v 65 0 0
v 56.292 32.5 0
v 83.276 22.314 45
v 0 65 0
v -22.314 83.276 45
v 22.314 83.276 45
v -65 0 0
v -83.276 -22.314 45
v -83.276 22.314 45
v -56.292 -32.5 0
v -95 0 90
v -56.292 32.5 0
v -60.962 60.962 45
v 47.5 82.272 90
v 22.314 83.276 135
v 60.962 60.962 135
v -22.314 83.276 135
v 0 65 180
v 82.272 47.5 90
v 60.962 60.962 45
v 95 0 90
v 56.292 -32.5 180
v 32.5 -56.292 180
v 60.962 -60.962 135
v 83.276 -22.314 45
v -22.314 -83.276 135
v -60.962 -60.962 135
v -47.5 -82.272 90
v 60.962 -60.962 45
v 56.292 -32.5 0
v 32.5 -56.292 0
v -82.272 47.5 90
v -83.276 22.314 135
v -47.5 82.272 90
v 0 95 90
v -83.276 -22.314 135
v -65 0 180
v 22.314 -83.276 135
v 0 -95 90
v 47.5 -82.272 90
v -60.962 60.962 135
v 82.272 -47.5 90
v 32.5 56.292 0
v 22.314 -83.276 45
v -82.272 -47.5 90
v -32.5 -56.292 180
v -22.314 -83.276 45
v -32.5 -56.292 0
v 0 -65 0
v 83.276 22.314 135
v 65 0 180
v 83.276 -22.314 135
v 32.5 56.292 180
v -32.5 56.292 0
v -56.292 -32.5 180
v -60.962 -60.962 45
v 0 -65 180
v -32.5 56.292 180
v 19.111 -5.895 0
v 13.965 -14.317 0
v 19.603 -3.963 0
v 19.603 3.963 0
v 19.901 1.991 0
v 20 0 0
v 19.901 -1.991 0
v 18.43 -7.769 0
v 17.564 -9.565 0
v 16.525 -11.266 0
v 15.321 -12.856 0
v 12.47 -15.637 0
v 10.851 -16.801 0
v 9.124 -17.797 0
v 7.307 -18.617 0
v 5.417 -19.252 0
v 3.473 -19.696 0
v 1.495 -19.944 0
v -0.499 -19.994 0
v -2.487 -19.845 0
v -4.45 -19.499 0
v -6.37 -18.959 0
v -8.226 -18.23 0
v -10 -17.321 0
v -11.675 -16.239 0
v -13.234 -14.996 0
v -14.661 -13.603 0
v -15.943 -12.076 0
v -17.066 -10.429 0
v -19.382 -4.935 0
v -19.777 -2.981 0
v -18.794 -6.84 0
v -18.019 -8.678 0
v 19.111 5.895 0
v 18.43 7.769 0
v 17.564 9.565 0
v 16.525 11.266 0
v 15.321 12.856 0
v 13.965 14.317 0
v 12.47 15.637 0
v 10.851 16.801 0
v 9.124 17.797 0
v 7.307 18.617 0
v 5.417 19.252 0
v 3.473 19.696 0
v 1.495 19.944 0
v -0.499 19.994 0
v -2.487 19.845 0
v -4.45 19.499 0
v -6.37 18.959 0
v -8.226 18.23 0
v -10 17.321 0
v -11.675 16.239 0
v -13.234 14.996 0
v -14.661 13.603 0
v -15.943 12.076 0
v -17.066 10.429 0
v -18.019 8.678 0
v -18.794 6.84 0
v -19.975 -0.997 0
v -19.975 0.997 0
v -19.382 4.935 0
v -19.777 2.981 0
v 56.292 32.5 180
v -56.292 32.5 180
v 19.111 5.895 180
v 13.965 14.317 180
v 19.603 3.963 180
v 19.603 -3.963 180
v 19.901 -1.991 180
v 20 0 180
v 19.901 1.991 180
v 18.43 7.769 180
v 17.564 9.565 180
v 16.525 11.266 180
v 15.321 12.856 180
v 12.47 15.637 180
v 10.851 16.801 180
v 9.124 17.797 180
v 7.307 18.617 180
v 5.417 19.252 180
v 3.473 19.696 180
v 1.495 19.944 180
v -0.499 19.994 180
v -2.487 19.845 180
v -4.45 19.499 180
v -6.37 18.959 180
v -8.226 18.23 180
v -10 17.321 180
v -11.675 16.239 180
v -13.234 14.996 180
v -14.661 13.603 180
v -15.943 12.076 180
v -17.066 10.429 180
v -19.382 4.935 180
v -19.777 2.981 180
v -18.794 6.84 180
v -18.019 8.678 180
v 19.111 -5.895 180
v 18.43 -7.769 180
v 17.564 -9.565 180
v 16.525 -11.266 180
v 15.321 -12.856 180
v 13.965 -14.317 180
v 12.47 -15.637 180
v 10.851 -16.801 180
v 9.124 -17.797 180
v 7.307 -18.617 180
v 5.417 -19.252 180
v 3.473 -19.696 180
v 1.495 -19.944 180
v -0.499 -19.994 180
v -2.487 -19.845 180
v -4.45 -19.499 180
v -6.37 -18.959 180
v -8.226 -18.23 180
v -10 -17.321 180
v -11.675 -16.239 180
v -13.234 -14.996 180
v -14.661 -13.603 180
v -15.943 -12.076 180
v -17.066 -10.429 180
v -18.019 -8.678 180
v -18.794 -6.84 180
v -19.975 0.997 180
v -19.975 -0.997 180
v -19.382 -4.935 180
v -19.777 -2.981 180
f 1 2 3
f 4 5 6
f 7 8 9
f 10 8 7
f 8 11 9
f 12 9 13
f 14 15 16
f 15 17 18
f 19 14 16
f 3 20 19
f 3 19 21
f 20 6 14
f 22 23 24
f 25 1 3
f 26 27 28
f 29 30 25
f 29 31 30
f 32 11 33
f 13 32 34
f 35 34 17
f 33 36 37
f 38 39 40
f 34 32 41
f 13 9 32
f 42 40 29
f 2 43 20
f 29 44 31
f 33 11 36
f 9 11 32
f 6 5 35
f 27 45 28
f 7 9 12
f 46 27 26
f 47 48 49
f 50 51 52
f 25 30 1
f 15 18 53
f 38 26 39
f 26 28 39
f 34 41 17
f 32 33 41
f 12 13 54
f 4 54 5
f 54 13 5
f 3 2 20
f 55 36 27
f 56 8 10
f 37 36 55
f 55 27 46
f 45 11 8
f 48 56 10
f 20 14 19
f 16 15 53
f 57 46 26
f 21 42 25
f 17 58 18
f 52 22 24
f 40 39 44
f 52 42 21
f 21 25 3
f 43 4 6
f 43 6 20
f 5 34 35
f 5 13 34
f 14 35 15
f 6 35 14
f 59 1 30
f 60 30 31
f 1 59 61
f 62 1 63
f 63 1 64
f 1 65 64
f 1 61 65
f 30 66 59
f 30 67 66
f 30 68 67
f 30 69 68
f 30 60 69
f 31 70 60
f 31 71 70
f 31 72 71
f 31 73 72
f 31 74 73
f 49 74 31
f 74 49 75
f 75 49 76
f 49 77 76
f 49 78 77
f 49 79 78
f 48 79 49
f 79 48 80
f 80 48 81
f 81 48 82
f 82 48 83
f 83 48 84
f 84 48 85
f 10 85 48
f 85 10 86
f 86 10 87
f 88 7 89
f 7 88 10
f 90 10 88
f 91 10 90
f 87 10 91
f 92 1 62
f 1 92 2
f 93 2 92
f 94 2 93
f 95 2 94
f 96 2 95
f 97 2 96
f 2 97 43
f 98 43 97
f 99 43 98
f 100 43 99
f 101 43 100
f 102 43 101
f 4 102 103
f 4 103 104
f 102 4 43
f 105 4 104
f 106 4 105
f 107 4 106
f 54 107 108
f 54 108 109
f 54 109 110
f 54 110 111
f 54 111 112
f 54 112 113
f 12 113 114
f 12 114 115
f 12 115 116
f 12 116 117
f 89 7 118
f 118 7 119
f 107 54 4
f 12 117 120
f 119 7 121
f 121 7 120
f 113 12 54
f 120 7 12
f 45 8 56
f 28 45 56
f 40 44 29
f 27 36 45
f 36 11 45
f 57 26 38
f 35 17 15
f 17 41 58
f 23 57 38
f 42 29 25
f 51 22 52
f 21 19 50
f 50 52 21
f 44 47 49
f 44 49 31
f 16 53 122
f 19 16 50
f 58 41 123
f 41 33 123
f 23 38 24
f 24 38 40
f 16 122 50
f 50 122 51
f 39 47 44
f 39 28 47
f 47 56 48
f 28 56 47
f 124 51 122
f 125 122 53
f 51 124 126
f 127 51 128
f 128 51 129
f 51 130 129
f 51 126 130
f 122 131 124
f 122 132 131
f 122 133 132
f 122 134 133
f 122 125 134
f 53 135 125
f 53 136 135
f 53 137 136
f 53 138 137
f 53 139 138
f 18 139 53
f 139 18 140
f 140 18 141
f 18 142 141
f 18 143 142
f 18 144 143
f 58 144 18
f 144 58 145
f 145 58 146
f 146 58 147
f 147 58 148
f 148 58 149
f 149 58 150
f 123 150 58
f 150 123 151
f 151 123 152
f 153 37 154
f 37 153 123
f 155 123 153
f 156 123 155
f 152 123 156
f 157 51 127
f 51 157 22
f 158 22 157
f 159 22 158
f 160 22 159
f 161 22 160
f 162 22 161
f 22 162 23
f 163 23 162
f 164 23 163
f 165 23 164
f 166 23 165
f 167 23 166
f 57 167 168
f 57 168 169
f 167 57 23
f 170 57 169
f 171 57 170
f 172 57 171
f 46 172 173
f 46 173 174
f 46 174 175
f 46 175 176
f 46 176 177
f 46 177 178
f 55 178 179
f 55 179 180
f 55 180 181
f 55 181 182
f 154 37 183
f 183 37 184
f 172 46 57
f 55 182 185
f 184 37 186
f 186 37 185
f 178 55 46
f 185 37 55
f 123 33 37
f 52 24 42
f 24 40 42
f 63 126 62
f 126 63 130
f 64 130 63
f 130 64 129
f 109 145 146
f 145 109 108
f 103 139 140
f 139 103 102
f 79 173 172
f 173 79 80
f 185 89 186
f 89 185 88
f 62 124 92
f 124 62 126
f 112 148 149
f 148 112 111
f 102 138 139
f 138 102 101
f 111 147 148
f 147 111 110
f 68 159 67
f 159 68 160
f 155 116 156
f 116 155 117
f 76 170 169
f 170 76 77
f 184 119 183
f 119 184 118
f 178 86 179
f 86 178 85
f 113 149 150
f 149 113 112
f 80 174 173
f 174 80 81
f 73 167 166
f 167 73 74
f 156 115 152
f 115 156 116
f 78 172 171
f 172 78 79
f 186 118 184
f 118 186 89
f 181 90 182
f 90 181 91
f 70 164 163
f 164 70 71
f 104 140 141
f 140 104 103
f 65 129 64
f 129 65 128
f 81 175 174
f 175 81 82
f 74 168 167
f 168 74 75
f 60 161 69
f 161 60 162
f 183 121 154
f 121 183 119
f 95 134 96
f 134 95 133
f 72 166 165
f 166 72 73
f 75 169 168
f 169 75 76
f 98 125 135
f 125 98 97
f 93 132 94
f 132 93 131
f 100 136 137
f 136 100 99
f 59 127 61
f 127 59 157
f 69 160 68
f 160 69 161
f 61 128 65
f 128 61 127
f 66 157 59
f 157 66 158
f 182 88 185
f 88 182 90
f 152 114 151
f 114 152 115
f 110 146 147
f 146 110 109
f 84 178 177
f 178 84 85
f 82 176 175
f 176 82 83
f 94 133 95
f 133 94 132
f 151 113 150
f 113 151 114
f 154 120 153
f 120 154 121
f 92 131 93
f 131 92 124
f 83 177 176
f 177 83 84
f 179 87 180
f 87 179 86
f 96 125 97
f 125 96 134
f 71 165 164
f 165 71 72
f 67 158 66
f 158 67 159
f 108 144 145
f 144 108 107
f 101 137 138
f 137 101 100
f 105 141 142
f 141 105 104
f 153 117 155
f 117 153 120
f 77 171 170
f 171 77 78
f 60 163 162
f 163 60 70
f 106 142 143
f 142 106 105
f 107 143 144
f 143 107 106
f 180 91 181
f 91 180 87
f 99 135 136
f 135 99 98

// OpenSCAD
CylinderPoints = [[65.0, 0.0, 0.0], [56.2917, 32.5, 0.0], [32.5, 56.2917, 0.0], [0.0, 65.0, 0.0], [-32.5, 56.2917, 0.0], [-56.2917, 32.5, 0.0], [-65.0, 0.0, 0.0], [-56.2917, -32.5, 0.0], [-32.5, -56.2917, 0.0], [-0.0, -65.0, 0.0], [32.5, -56.2917, 0.0], [56.2917, -32.5, 0.0], [83.2756, 22.3136, 45.0], [60.9619, 60.9619, 45.0], [22.3136, 83.2756, 45.0], [-22.3136, 83.2756, 45.0], [-60.9619, 60.9619, 45.0], [-83.2756, 22.3136, 45.0], [-83.2756, -22.3136, 45.0], [-60.9619, -60.9619, 45.0], [-22.3136, -83.2756, 45.0], [22.3136, -83.2756, 45.0], [60.9619, -60.9619, 45.0], [83.2756, -22.3136, 45.0], [95.0, 0.0, 90.0], [82.2724, 47.5, 90.0], [47.5, 82.2724, 90.0], [0.0, 95.0, 90.0], [-47.5, 82.2724, 90.0], [-82.2724, 47.5, 90.0], [-95.0, 0.0, 90.0], [-82.2724, -47.5, 90.0], [-47.5, -82.2724, 90.0], [-0.0, -95.0, 90.0], [47.5, -82.2724, 90.0], [82.2724, -47.5, 90.0], [83.2756, 22.3136, 135.0], [60.9619, 60.9619, 135.0], [22.3136, 83.2756, 135.0], [-22.3136, 83.2756, 135.0], [-60.9619, 60.9619, 135.0], [-83.2756, 22.3136, 135.0], [-83.2756, -22.3136, 135.0], [-60.9619, -60.9619, 135.0], [-22.3136, -83.2756, 135.0], [22.3136, -83.2756, 135.0], [60.9619, -60.9619, 135.0], [83.2756, -22.3136, 135.0], [65.0, 0.0, 180.0], [56.2917, 32.5, 180.0], [32.5, 56.2917, 180.0], [0.0, 65.0, 180.0], [-32.5, 56.2917, 180.0], [-56.2917, 32.5, 180.0], [-65.0, 0.0, 180.0], [-56.2917, -32.5, 180.0], [-32.5, -56.2917, 180.0], [-0.0, -65.0, 180.0], [32.5, -56.2917, 180.0], [56.2917, -32.5, 180.0], [0, 0, 0], [0, 0, 180]];
CylinderFaces = [[0, 12, 1], [1, 12, 13], [1, 13, 2], [2, 13, 14], [2, 14, 3], [3, 14, 15], [3, 15, 4], [4, 15, 16], [4, 16, 5], [5, 16, 17], [5, 17, 6], [6, 17, 18], [6, 18, 7], [7, 18, 19], [7, 19, 8], [8, 19, 20], [8, 20, 9], [9, 20, 21], [9, 21, 10], [10, 21, 22], [10, 22, 11], [11, 22, 23], [11, 23, 0], [12, 0, 23], [23, 24, 12], [12, 24, 25], [12, 25, 13], [13, 25, 26], [13, 26, 14], [14, 26, 27], [14, 27, 15], [15, 27, 28], [15, 28, 16], [16, 28, 29], [16, 29, 17], [17, 29, 30], [17, 30, 18], [18, 30, 31], [18, 31, 19], [19, 31, 32], [19, 32, 20], [20, 32, 33], [20, 33, 21], [21, 33, 34], [21, 34, 22], [22, 34, 35], [22, 35, 23], [23, 35, 24], [24, 36, 25], [25, 36, 37], [25, 37, 26], [26, 37, 38], [26, 38, 27], [27, 38, 39], [27, 39, 28], [28, 39, 40], [28, 40, 29], [29, 40, 41], [29, 41, 30], [30, 41, 42], [30, 42, 31], [31, 42, 43], [31, 43, 32], [32, 43, 44], [32, 44, 33], [33, 44, 45], [33, 45, 34], [34, 45, 46], [34, 46, 35], [35, 46, 47], [35, 47, 24], [36, 24, 47], [47, 48, 36], [36, 48, 49], [36, 49, 37], [37, 49, 50], [37, 50, 38], [38, 50, 51], [38, 51, 39], [39, 51, 52], [39, 52, 40], [40, 52, 53], [40, 53, 41], [41, 53, 54], [41, 54, 42], [42, 54, 55], [42, 55, 43], [43, 55, 56], [43, 56, 44], [44, 56, 57], [44, 57, 45], [45, 57, 58], [45, 58, 46], [46, 58, 59], [46, 59, 47], [47, 59, 48], [0, 1, 60], [49.0, 48.0, 61], [1, 2, 60], [50.0, 49.0, 61], [2, 3, 60], [51.0, 50.0, 61], [3, 4, 60], [52.0, 51.0, 61], [4, 5, 60], [53.0, 52.0, 61], [5, 6, 60], [54.0, 53.0, 61], [6, 7, 60], [55.0, 54.0, 61], [7, 8, 60], [56.0, 55.0, 61], [8, 9, 60], [57.0, 56.0, 61], [9, 10, 60], [58.0, 57.0, 61], [10, 11, 60], [59.0, 58.0, 61], [11, 0, 60], [48.0, 59.0, 61]];
difference() {
    polyhedron(CylinderPoints, CylinderFaces, convexity=10);
    translate([0, 0, -10]) linear_extrude(200) circle(d=40, $fa=1);
}
